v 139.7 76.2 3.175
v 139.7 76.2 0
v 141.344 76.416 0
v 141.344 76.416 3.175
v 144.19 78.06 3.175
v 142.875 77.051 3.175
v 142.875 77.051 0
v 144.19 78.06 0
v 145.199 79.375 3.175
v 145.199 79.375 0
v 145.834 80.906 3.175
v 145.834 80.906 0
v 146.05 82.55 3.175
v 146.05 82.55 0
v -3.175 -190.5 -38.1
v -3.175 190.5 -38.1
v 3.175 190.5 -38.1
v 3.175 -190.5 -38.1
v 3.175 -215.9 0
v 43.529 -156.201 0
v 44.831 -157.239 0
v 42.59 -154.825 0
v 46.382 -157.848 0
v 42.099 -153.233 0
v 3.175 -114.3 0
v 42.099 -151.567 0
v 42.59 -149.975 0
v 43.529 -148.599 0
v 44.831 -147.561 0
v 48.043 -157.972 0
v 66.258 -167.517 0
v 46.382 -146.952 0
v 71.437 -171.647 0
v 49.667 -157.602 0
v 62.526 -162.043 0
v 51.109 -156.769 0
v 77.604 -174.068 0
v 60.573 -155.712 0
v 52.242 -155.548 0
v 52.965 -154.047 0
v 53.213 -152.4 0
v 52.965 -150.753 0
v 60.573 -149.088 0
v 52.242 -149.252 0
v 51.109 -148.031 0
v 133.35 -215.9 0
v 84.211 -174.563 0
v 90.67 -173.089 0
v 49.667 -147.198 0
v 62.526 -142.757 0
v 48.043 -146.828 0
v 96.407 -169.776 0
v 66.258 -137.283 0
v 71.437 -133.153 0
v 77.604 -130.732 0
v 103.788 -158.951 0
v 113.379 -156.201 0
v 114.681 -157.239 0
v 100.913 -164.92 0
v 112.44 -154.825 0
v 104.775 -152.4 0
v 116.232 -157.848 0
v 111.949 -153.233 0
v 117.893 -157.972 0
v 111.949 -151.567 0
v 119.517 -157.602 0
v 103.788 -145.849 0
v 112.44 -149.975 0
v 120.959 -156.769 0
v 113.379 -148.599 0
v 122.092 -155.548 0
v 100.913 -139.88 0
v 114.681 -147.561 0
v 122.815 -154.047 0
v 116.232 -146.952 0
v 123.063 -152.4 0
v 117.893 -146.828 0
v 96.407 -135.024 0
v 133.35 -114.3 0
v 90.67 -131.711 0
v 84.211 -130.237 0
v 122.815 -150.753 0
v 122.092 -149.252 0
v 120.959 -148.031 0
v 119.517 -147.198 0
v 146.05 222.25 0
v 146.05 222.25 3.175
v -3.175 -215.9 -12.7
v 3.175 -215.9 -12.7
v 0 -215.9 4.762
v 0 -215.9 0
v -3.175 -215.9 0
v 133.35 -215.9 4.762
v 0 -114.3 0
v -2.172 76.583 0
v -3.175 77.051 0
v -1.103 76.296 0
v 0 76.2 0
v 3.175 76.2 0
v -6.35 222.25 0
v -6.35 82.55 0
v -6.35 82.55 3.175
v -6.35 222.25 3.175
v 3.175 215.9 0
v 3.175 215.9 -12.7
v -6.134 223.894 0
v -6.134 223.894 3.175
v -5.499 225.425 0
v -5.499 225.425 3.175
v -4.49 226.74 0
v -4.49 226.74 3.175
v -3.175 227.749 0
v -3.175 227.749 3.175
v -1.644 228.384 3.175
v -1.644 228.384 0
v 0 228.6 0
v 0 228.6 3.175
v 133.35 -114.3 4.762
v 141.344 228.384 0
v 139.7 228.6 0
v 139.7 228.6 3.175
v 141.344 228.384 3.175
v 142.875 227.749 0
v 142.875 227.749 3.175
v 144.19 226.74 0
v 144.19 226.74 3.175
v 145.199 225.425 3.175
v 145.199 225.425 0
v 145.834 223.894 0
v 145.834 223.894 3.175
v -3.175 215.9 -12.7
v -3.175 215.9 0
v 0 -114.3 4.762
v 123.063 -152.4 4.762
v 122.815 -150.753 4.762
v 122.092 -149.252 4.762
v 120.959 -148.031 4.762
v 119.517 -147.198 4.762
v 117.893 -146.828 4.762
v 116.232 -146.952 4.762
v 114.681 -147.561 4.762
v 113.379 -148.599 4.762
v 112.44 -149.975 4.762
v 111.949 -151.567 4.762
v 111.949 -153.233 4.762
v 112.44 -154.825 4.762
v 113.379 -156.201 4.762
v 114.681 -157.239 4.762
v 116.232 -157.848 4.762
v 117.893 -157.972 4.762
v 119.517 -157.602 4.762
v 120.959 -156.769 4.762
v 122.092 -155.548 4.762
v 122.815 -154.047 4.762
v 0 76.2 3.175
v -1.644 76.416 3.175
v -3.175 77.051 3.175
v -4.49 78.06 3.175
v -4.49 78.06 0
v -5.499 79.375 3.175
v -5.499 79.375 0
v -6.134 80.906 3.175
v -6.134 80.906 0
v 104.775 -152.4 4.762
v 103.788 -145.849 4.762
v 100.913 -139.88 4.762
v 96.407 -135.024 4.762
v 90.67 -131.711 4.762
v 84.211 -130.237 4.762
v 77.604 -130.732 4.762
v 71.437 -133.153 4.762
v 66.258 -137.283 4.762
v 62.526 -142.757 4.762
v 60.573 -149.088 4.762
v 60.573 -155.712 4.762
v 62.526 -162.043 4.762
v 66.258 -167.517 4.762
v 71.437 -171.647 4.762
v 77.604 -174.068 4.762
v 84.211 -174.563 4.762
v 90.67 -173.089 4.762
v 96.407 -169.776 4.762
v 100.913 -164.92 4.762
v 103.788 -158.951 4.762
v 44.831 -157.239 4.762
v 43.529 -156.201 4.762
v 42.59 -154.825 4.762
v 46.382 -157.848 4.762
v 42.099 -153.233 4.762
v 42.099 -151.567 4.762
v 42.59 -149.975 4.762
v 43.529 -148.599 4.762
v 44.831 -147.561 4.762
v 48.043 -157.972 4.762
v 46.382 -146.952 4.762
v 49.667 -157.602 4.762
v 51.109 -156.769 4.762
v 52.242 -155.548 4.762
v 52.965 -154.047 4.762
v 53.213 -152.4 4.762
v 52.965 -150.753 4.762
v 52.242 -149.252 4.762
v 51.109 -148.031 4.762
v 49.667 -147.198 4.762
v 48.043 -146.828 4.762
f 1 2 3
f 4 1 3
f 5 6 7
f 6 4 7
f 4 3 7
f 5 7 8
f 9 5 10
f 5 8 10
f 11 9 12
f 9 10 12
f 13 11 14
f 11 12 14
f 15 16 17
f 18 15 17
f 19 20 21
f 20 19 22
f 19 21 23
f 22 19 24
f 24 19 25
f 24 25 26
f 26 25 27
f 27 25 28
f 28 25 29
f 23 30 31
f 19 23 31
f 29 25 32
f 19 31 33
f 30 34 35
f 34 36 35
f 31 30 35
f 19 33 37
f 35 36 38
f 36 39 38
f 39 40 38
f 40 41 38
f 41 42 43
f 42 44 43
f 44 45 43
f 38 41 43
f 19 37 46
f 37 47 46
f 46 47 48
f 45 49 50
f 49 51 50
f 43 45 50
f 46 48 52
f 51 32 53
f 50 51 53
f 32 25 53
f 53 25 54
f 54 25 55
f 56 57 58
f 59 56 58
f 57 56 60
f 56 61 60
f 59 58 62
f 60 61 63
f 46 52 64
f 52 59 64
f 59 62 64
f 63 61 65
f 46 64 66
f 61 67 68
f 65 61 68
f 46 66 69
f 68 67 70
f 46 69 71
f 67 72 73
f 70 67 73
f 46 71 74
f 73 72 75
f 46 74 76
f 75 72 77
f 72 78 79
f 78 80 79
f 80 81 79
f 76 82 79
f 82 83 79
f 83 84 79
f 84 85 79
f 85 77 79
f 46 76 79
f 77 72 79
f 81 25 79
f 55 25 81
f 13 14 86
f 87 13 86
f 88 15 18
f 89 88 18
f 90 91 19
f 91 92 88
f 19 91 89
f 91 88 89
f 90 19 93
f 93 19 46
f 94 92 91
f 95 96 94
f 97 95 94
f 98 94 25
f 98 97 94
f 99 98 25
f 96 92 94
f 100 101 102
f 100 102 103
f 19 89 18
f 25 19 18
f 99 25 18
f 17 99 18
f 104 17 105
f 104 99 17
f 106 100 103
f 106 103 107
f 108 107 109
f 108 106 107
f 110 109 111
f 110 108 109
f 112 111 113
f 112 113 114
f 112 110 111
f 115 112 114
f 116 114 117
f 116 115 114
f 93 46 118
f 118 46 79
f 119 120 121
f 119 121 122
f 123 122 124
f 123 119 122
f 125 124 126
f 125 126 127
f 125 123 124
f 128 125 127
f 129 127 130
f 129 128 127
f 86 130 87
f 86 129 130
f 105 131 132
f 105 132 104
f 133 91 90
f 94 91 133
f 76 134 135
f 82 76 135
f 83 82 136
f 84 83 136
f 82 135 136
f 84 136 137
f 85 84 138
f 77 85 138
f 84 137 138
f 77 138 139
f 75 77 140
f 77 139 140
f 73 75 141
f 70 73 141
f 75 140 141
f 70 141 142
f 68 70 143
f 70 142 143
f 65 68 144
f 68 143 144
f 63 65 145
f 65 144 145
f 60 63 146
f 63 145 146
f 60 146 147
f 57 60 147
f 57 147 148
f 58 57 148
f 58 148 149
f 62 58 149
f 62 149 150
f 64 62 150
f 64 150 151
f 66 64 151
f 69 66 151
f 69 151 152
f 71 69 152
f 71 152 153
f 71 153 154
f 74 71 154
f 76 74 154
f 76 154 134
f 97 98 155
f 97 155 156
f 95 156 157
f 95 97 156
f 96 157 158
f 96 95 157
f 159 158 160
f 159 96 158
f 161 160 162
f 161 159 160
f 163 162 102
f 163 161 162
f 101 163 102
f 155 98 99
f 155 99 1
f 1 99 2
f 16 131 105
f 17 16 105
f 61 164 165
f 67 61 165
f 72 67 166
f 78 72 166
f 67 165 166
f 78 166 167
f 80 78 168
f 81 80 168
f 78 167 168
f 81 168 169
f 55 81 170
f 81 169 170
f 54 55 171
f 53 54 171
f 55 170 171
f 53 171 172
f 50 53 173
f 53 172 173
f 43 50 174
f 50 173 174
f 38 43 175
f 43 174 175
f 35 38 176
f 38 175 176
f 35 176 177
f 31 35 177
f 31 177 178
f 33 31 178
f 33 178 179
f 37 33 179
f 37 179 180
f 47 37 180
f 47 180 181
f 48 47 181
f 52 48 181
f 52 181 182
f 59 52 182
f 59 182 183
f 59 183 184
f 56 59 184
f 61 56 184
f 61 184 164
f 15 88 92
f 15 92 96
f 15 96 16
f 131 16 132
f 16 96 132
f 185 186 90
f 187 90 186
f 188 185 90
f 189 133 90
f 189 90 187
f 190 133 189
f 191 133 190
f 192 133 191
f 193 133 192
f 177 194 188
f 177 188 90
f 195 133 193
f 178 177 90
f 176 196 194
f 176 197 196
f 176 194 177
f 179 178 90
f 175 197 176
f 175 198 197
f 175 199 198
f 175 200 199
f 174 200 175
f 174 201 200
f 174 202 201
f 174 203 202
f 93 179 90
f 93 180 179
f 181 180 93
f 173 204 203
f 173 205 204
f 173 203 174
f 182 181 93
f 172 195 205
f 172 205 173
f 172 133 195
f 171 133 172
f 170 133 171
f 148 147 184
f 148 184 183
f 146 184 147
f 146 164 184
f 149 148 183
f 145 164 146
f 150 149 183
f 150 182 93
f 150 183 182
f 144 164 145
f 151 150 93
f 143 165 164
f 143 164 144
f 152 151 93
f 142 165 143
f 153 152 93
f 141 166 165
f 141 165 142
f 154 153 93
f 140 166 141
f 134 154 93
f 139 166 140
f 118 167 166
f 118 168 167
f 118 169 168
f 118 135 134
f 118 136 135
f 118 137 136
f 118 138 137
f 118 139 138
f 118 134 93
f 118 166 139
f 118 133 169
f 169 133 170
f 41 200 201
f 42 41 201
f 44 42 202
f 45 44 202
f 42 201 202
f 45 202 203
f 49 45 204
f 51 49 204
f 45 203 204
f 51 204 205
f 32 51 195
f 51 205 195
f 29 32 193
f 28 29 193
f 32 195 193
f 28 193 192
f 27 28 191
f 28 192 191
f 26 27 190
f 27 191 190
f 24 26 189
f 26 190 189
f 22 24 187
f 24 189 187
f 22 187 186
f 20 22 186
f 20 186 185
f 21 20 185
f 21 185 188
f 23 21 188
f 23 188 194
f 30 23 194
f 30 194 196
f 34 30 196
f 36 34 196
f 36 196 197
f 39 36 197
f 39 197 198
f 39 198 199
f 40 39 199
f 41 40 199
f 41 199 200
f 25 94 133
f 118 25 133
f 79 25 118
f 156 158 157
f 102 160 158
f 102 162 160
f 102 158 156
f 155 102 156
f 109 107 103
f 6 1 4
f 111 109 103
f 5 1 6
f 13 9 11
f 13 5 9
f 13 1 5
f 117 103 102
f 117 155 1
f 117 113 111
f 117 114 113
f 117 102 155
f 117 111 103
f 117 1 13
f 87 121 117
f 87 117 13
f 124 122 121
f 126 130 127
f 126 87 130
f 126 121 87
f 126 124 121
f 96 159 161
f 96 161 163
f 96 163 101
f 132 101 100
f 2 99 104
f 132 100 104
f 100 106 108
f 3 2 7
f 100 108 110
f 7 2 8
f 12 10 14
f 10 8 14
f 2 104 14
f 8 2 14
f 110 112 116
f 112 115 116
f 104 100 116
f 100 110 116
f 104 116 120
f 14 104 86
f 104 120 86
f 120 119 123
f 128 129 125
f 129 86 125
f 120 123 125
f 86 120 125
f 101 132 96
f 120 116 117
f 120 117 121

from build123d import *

# Parameters (mm, degrees)
F0_W        = 6.35
F0_H        = 431.8
F1_DEPTH    = 38.1
F2_SIZE     = 25.4
F3_W        = 133.35
F3_H        = 101.6
F4_DEPTH    = 4.7625
F5_R        = 22.225
F5_R_2      = 5.588
F6_DEPTH    = 25.4
F7_W        = 152.4
F7_H        = 152.4
F8_DEPTH    = 3.175
F9_T1_DEPTH = 34.925
F9_T3_DEPTH = 19.05


# Not quite as in the source:
# - a fillet or chamfer that OpenCascade refuses, or shapes differently, is made with other operations: its cross-section is extruded or revolved along the edge and cut away or added


with BuildPart() as f1:
    # F0 (on Top) → F1 (new body)
    with BuildSketch(Plane.XY):
        Rectangle(F0_W, F0_H)
    extrude(amount=-F1_DEPTH)

    # F2
    f2_edges = [f1.edges().sort_by_distance(p)[0] for p in [
        (0, -215.9, -38.1),
        (0, 215.9, -38.1),
    ]]
    chamfer(f2_edges, length=F2_SIZE)

    # F3 (on Top) → F4 (join)
    with BuildSketch(Plane.XY):
        with Locations((66.675, -165.1)):
            Rectangle(F3_W, F3_H)
    extrude(amount=F4_DEPTH)

    # F5 (on face) → F6 (cut)
    with BuildSketch(Plane.XY.offset(4.7625)):
        with Locations((82.55, -152.4)):
            Circle(F5_R)
        with Locations((47.625, -152.4)):
            Circle(F5_R_2)
        with Locations((117.475, -152.4)):
            Circle(F5_R_2)
    extrude(amount=-F6_DEPTH, mode=Mode.SUBTRACT)

    # F7 (on face) → F8 (join)
    with BuildSketch(Plane.XY):
        with Locations((69.85, 152.4)):
            Rectangle(F7_W, F7_H)
    extrude(amount=F8_DEPTH)

    # F9: fillet of radius 6.35 on 4 edges, made by hand

    # F9_s2 → F9_t1 (cut)
    with BuildSketch(Plane.XY.offset(-15.875)):
        with BuildLine():
            ThreePointArc((139.7, 76.2), (144.1901280605, 78.0598719395), (146.05, 82.55))
            Line((146.05, 82.55), (146.05, 76.2))
            Line((146.05, 76.2), (139.7, 76.2))
        make_face()
        with BuildLine():
            ThreePointArc((139.7, 228.6), (144.1901280605, 226.7401280605), (146.05, 222.25))
            Line((146.05, 222.25), (146.05, 228.6))
            Line((146.05, 228.6), (139.7, 228.6))
        make_face()
        with BuildLine():
            ThreePointArc((-6.35, 222.25), (-4.4901280605, 226.7401280605), (0, 228.6))
            Line((0, 228.6), (-6.35, 228.6))
            Line((-6.35, 228.6), (-6.35, 222.25))
        make_face()
    extrude(amount=F9_T1_DEPTH, mode=Mode.SUBTRACT)

    # F9_s4 → F9_t3 (cut)
    with BuildSketch(Plane.XY):
        with BuildLine():
            ThreePointArc((0, 76.2), (-4.4901280605, 78.0598719395), (-6.35, 82.55))
            Line((-6.35, 82.55), (-6.35, 76.2))
            Line((-6.35, 76.2), (0, 76.2))
        make_face()
    extrude(amount=F9_T3_DEPTH, mode=Mode.SUBTRACT)


solid = f1.part
